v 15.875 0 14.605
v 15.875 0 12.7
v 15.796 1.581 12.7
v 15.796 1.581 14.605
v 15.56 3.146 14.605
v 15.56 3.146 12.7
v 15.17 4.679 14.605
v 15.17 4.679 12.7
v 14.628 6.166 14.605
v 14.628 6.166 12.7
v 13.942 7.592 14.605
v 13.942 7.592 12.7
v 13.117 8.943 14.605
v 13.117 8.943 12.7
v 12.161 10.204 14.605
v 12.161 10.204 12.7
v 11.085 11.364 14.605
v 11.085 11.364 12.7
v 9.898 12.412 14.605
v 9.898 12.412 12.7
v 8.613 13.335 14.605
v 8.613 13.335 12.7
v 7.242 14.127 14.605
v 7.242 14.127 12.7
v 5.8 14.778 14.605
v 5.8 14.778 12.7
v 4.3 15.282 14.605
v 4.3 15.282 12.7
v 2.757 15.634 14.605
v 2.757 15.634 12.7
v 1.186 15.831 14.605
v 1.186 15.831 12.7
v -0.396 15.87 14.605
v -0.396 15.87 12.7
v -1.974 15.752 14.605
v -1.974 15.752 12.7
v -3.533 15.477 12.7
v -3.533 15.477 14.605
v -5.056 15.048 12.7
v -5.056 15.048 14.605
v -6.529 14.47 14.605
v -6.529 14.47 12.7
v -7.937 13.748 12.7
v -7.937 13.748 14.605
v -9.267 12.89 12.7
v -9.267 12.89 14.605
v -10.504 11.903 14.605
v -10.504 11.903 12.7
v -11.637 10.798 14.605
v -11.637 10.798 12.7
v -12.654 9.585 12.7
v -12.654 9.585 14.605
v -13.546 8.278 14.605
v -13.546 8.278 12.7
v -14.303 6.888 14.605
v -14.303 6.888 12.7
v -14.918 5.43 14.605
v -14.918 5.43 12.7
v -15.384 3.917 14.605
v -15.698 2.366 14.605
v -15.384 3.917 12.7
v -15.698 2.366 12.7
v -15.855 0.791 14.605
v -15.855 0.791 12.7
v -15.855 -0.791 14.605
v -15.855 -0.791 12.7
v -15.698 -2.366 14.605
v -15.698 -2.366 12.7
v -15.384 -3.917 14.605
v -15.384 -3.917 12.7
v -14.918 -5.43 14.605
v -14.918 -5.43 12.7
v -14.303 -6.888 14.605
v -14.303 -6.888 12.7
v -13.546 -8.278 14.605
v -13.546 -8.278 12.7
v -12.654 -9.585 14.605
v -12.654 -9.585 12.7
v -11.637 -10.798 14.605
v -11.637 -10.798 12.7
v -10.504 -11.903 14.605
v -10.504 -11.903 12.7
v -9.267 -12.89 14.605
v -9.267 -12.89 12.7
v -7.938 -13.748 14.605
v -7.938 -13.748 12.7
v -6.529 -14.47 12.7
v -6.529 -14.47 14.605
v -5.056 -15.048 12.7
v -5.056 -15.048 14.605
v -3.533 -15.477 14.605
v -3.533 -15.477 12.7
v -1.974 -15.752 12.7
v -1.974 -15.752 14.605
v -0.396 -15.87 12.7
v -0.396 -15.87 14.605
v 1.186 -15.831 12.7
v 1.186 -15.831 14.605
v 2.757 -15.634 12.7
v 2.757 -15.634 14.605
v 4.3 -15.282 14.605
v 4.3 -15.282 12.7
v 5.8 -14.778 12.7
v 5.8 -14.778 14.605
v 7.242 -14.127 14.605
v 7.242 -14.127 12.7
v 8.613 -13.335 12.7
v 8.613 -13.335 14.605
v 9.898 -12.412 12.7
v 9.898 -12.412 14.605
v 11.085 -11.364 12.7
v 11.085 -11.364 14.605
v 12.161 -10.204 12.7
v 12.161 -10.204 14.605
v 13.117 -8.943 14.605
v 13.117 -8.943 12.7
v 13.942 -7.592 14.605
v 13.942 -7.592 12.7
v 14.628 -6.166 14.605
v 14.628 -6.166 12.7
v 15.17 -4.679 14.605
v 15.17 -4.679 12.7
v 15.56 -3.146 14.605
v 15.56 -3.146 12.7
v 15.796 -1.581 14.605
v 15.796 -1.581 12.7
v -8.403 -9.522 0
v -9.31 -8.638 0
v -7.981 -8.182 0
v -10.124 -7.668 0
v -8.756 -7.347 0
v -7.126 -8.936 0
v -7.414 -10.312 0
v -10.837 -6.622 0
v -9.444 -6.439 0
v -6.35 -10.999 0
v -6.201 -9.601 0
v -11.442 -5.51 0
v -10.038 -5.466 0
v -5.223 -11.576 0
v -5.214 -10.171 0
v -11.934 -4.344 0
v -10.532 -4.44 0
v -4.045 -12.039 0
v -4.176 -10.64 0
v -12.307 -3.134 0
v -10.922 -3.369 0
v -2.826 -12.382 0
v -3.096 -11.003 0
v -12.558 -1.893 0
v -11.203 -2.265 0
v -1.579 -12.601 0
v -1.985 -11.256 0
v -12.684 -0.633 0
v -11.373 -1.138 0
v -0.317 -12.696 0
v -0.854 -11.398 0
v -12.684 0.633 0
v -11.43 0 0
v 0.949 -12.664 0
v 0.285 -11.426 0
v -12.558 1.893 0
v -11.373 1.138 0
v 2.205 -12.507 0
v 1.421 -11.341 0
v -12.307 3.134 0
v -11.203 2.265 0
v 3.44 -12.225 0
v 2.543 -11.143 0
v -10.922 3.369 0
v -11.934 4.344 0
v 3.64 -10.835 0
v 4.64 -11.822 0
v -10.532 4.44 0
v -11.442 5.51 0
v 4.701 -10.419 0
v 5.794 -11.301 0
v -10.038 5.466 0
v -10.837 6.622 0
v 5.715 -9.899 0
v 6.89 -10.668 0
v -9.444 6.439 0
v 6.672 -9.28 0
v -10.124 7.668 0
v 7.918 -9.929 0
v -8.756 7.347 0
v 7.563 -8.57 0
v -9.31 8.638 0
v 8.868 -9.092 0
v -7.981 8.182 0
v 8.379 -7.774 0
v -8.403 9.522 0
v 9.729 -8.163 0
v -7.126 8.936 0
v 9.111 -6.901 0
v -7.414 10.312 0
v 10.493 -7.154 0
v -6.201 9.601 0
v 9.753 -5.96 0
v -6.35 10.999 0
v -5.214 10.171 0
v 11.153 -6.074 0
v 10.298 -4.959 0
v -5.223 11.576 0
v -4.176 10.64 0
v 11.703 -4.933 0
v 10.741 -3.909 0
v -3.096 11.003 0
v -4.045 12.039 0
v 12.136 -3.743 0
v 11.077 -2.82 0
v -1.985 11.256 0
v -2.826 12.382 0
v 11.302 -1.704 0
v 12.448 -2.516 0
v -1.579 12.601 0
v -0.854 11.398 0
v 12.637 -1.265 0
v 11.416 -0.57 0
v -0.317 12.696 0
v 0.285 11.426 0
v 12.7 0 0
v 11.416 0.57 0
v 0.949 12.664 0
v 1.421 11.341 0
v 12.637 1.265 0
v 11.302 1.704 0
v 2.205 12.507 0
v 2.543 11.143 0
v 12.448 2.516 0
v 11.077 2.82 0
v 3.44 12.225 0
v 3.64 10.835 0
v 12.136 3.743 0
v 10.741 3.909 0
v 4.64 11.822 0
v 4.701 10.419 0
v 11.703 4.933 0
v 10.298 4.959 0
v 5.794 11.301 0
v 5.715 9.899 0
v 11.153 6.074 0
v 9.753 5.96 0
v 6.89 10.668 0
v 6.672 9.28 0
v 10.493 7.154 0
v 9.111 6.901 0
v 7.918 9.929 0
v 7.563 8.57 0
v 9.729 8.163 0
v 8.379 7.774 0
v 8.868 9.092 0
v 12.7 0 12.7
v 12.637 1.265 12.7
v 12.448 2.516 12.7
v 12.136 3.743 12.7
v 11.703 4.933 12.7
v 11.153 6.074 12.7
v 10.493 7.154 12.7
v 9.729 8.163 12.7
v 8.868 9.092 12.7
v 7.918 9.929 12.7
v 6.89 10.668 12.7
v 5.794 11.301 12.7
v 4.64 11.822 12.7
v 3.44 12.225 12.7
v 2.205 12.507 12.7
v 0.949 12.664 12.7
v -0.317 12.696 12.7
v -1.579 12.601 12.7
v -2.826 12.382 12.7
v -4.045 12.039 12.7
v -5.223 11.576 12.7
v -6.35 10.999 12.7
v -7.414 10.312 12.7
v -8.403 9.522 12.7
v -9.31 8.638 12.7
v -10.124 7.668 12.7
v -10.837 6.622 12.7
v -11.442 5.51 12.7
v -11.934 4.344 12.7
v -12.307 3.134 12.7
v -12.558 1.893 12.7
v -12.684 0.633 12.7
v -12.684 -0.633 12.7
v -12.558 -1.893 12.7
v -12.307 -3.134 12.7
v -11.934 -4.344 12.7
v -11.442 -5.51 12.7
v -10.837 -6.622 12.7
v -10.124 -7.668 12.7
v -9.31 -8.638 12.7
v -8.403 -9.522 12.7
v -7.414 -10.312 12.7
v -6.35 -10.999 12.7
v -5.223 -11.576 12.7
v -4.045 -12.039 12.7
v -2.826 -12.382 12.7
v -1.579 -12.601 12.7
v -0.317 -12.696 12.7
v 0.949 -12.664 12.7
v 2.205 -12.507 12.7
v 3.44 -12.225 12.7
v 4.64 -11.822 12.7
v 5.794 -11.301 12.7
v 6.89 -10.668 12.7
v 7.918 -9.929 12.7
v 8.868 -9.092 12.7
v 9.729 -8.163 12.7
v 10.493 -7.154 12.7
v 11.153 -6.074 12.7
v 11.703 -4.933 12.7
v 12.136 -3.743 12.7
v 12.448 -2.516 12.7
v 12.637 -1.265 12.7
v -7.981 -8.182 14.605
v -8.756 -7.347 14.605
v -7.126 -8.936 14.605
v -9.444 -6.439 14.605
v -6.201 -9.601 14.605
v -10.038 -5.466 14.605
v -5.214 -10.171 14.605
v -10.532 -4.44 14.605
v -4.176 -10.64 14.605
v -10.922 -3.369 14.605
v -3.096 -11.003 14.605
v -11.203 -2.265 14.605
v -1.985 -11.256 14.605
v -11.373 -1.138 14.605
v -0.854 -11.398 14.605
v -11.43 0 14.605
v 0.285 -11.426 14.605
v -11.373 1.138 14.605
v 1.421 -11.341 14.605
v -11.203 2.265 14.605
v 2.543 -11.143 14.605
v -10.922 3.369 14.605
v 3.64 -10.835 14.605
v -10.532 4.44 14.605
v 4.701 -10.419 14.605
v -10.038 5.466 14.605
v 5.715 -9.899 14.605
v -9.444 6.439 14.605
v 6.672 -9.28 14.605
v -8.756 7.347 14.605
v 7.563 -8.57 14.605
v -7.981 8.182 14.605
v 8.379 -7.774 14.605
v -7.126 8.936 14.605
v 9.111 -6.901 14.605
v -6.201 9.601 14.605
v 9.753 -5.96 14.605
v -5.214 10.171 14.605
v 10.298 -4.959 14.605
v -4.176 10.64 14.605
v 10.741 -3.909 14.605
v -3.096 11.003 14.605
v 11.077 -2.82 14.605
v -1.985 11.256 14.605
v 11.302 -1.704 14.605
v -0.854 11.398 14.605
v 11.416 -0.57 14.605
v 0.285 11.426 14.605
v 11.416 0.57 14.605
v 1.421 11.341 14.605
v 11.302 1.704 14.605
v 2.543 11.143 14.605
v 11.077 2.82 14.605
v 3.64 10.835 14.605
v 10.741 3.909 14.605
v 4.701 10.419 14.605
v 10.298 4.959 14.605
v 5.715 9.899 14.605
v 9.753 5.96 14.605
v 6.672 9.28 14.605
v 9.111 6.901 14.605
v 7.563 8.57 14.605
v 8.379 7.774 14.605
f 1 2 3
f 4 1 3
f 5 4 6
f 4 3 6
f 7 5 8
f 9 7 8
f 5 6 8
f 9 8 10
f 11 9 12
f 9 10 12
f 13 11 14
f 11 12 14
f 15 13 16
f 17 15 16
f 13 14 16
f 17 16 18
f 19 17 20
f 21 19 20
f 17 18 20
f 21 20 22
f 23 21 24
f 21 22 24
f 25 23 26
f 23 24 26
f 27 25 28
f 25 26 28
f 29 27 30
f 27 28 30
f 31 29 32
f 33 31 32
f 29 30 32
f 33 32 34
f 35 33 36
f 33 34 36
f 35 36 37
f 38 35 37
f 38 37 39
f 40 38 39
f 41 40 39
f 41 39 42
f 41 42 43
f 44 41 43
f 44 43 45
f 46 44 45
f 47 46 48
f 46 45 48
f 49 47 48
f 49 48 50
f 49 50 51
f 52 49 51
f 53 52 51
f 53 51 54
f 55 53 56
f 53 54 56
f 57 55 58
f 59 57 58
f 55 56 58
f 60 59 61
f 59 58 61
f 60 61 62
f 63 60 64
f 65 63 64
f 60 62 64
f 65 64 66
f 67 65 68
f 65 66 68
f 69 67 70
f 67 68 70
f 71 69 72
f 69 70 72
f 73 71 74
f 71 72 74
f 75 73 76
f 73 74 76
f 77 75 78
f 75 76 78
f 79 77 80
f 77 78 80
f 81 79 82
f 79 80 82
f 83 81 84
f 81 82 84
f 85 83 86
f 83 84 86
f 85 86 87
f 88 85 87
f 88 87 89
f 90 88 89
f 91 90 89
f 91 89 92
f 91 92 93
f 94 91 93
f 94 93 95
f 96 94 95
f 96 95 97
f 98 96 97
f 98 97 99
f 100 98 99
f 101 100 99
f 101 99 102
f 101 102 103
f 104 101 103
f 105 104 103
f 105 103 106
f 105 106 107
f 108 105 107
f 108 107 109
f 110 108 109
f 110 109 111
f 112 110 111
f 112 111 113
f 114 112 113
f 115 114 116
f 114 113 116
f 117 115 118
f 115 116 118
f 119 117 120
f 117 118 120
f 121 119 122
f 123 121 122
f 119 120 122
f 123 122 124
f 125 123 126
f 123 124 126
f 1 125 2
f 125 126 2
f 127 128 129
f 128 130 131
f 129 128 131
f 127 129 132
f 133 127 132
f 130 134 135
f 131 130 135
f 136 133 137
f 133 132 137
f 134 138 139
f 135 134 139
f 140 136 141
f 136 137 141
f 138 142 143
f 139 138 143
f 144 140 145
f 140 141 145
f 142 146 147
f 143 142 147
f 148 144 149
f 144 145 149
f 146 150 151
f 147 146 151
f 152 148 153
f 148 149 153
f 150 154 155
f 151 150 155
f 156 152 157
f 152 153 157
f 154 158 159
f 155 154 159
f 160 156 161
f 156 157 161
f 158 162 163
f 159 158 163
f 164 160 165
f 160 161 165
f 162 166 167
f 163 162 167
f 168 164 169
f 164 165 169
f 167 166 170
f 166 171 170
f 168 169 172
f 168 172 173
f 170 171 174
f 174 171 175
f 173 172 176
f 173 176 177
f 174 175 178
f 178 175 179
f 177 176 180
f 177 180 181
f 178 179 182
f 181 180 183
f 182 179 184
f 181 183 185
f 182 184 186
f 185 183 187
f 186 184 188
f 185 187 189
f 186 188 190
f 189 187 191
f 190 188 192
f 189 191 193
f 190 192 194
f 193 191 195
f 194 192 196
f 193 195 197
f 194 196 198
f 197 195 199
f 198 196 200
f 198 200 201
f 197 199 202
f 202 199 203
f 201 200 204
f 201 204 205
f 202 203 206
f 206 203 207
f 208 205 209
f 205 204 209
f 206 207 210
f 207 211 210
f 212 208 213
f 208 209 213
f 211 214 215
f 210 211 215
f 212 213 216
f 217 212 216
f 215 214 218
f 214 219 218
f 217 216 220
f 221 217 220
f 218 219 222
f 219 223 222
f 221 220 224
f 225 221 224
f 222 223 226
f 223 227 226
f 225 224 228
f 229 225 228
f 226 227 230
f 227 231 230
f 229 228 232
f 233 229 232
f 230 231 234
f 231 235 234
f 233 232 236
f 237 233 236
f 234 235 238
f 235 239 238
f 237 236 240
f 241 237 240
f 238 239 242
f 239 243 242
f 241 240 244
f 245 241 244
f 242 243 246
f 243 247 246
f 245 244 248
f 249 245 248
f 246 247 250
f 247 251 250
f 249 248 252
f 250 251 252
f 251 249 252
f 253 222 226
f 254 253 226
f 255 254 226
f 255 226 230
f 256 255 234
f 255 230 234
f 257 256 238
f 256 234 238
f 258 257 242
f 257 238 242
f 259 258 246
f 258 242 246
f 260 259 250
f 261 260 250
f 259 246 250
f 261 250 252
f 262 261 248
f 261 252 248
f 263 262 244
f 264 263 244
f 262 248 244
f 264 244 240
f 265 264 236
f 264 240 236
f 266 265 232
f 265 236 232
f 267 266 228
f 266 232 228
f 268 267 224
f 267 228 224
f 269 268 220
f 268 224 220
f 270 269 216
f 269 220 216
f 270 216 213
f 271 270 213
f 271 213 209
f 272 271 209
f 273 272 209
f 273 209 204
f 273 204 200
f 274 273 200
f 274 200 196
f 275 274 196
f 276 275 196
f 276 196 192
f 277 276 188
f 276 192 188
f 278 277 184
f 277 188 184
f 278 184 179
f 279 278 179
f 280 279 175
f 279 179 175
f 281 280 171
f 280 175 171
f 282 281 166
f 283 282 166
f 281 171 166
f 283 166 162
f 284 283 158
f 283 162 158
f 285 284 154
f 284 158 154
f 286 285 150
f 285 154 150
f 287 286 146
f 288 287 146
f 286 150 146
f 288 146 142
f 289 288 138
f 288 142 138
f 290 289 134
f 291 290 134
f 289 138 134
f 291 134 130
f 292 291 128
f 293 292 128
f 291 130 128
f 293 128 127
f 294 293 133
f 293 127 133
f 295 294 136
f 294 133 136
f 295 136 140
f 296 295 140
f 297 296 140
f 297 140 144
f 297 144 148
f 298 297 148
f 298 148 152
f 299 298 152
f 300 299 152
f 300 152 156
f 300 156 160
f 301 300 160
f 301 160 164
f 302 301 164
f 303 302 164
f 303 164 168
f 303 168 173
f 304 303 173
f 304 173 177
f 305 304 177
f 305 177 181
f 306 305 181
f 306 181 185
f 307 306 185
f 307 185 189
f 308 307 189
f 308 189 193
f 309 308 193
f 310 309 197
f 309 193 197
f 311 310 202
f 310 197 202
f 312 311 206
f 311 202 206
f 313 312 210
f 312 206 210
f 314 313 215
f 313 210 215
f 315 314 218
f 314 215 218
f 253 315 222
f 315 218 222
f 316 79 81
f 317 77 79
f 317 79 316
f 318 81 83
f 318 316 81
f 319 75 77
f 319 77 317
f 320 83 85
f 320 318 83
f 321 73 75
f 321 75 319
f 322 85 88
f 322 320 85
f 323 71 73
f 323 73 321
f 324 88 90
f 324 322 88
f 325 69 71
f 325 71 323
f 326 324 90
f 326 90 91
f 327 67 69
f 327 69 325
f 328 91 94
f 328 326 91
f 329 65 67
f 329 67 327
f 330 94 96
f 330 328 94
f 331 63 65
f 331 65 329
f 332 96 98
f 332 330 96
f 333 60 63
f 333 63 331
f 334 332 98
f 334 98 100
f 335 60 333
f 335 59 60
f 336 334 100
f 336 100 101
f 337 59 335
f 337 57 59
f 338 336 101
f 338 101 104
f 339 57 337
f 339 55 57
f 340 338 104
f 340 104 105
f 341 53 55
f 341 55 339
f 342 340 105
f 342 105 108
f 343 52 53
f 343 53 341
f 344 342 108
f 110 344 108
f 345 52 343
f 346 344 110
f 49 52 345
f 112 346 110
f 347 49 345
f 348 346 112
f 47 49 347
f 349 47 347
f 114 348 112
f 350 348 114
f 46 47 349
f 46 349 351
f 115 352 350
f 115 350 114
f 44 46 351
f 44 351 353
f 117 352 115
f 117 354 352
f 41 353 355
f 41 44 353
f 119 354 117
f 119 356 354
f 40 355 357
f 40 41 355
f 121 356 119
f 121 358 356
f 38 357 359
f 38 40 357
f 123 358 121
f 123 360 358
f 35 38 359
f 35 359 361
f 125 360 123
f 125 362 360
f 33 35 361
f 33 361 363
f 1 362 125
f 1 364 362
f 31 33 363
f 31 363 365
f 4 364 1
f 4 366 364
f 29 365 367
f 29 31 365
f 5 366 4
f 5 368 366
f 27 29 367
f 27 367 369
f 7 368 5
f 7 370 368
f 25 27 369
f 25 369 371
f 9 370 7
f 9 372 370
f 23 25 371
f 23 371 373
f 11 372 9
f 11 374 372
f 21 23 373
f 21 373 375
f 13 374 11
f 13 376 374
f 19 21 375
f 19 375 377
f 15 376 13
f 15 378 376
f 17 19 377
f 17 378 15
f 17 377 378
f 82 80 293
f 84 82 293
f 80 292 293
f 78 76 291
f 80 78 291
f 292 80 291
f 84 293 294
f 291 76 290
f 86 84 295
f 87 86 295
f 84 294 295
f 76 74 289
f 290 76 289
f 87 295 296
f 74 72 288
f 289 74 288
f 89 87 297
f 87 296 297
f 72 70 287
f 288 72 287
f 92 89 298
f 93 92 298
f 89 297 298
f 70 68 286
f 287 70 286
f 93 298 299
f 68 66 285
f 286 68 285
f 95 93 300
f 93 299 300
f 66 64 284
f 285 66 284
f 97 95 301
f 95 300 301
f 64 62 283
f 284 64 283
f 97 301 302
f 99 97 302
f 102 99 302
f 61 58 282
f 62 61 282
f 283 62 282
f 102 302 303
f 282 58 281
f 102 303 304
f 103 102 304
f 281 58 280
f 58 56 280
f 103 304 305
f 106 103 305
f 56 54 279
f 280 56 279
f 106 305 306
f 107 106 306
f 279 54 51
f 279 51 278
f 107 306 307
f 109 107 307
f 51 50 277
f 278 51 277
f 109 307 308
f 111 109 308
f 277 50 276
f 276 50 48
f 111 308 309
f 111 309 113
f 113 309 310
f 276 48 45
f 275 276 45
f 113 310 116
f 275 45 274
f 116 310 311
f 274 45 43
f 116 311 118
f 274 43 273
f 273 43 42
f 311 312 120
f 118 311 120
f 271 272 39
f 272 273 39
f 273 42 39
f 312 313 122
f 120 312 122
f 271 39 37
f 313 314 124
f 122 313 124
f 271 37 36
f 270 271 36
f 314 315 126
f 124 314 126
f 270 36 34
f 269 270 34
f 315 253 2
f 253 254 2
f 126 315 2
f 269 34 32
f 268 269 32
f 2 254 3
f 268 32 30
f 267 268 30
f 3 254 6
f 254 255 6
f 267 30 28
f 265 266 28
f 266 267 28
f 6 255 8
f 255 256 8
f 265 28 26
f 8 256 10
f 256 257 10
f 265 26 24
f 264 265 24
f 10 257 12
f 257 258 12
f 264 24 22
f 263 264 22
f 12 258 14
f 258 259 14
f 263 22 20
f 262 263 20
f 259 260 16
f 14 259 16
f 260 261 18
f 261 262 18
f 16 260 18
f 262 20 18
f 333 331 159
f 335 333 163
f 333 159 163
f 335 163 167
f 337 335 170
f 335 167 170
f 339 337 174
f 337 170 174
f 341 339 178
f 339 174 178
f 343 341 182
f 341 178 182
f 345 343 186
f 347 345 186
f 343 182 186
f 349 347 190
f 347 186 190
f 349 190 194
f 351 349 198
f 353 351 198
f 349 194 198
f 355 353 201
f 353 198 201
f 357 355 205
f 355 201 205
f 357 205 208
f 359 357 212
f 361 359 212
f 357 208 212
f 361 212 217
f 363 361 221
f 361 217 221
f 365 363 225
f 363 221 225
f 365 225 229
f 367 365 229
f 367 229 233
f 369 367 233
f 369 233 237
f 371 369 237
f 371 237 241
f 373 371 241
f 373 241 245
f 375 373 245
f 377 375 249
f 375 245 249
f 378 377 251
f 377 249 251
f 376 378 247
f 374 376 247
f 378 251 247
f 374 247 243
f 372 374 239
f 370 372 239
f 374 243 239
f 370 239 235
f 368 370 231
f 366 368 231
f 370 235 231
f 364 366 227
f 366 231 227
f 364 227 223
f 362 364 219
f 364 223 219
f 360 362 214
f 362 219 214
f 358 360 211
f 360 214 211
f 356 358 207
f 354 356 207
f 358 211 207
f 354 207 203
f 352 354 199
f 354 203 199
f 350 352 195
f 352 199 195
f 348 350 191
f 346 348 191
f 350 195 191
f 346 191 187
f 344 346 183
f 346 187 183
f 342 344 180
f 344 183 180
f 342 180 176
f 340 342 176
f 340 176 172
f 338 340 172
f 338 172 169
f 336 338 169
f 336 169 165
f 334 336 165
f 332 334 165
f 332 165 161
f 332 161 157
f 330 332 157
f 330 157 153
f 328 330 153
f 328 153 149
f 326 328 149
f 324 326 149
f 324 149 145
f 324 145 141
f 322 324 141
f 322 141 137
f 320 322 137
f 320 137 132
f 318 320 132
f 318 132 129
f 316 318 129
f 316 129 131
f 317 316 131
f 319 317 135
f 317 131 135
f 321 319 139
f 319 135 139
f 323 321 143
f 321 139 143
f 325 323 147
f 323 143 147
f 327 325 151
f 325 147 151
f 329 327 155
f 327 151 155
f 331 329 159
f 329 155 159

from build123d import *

# Parameters (mm, degrees)
F0_R     = 12.7
F1_DEPTH = 12.7
F3_D     = 22.86
F4_R     = 15.875
F5_DEPTH = 1.905
F7_D     = 22.86


with BuildPart() as f1:
    # F0 (on Top) → F1 (new body)
    with BuildSketch(Plane.XY):
        Circle(F0_R)
    extrude(amount=F1_DEPTH)

    # F3 (through all)
    with Locations(Plane.XY.offset(14.605)):
        with Locations((0, 0)):
            Hole(F3_D / 2)

    # F4 (on face) → F5 (join)
    with BuildSketch(Plane.XY.offset(12.7)):
        Circle(F4_R)
    extrude(amount=F5_DEPTH)

    # F7 (through all)
    with Locations(Plane.XY.offset(12.7)):
        with Locations((0, 0)):
            Hole(F7_D / 2)


solid = f1.part
